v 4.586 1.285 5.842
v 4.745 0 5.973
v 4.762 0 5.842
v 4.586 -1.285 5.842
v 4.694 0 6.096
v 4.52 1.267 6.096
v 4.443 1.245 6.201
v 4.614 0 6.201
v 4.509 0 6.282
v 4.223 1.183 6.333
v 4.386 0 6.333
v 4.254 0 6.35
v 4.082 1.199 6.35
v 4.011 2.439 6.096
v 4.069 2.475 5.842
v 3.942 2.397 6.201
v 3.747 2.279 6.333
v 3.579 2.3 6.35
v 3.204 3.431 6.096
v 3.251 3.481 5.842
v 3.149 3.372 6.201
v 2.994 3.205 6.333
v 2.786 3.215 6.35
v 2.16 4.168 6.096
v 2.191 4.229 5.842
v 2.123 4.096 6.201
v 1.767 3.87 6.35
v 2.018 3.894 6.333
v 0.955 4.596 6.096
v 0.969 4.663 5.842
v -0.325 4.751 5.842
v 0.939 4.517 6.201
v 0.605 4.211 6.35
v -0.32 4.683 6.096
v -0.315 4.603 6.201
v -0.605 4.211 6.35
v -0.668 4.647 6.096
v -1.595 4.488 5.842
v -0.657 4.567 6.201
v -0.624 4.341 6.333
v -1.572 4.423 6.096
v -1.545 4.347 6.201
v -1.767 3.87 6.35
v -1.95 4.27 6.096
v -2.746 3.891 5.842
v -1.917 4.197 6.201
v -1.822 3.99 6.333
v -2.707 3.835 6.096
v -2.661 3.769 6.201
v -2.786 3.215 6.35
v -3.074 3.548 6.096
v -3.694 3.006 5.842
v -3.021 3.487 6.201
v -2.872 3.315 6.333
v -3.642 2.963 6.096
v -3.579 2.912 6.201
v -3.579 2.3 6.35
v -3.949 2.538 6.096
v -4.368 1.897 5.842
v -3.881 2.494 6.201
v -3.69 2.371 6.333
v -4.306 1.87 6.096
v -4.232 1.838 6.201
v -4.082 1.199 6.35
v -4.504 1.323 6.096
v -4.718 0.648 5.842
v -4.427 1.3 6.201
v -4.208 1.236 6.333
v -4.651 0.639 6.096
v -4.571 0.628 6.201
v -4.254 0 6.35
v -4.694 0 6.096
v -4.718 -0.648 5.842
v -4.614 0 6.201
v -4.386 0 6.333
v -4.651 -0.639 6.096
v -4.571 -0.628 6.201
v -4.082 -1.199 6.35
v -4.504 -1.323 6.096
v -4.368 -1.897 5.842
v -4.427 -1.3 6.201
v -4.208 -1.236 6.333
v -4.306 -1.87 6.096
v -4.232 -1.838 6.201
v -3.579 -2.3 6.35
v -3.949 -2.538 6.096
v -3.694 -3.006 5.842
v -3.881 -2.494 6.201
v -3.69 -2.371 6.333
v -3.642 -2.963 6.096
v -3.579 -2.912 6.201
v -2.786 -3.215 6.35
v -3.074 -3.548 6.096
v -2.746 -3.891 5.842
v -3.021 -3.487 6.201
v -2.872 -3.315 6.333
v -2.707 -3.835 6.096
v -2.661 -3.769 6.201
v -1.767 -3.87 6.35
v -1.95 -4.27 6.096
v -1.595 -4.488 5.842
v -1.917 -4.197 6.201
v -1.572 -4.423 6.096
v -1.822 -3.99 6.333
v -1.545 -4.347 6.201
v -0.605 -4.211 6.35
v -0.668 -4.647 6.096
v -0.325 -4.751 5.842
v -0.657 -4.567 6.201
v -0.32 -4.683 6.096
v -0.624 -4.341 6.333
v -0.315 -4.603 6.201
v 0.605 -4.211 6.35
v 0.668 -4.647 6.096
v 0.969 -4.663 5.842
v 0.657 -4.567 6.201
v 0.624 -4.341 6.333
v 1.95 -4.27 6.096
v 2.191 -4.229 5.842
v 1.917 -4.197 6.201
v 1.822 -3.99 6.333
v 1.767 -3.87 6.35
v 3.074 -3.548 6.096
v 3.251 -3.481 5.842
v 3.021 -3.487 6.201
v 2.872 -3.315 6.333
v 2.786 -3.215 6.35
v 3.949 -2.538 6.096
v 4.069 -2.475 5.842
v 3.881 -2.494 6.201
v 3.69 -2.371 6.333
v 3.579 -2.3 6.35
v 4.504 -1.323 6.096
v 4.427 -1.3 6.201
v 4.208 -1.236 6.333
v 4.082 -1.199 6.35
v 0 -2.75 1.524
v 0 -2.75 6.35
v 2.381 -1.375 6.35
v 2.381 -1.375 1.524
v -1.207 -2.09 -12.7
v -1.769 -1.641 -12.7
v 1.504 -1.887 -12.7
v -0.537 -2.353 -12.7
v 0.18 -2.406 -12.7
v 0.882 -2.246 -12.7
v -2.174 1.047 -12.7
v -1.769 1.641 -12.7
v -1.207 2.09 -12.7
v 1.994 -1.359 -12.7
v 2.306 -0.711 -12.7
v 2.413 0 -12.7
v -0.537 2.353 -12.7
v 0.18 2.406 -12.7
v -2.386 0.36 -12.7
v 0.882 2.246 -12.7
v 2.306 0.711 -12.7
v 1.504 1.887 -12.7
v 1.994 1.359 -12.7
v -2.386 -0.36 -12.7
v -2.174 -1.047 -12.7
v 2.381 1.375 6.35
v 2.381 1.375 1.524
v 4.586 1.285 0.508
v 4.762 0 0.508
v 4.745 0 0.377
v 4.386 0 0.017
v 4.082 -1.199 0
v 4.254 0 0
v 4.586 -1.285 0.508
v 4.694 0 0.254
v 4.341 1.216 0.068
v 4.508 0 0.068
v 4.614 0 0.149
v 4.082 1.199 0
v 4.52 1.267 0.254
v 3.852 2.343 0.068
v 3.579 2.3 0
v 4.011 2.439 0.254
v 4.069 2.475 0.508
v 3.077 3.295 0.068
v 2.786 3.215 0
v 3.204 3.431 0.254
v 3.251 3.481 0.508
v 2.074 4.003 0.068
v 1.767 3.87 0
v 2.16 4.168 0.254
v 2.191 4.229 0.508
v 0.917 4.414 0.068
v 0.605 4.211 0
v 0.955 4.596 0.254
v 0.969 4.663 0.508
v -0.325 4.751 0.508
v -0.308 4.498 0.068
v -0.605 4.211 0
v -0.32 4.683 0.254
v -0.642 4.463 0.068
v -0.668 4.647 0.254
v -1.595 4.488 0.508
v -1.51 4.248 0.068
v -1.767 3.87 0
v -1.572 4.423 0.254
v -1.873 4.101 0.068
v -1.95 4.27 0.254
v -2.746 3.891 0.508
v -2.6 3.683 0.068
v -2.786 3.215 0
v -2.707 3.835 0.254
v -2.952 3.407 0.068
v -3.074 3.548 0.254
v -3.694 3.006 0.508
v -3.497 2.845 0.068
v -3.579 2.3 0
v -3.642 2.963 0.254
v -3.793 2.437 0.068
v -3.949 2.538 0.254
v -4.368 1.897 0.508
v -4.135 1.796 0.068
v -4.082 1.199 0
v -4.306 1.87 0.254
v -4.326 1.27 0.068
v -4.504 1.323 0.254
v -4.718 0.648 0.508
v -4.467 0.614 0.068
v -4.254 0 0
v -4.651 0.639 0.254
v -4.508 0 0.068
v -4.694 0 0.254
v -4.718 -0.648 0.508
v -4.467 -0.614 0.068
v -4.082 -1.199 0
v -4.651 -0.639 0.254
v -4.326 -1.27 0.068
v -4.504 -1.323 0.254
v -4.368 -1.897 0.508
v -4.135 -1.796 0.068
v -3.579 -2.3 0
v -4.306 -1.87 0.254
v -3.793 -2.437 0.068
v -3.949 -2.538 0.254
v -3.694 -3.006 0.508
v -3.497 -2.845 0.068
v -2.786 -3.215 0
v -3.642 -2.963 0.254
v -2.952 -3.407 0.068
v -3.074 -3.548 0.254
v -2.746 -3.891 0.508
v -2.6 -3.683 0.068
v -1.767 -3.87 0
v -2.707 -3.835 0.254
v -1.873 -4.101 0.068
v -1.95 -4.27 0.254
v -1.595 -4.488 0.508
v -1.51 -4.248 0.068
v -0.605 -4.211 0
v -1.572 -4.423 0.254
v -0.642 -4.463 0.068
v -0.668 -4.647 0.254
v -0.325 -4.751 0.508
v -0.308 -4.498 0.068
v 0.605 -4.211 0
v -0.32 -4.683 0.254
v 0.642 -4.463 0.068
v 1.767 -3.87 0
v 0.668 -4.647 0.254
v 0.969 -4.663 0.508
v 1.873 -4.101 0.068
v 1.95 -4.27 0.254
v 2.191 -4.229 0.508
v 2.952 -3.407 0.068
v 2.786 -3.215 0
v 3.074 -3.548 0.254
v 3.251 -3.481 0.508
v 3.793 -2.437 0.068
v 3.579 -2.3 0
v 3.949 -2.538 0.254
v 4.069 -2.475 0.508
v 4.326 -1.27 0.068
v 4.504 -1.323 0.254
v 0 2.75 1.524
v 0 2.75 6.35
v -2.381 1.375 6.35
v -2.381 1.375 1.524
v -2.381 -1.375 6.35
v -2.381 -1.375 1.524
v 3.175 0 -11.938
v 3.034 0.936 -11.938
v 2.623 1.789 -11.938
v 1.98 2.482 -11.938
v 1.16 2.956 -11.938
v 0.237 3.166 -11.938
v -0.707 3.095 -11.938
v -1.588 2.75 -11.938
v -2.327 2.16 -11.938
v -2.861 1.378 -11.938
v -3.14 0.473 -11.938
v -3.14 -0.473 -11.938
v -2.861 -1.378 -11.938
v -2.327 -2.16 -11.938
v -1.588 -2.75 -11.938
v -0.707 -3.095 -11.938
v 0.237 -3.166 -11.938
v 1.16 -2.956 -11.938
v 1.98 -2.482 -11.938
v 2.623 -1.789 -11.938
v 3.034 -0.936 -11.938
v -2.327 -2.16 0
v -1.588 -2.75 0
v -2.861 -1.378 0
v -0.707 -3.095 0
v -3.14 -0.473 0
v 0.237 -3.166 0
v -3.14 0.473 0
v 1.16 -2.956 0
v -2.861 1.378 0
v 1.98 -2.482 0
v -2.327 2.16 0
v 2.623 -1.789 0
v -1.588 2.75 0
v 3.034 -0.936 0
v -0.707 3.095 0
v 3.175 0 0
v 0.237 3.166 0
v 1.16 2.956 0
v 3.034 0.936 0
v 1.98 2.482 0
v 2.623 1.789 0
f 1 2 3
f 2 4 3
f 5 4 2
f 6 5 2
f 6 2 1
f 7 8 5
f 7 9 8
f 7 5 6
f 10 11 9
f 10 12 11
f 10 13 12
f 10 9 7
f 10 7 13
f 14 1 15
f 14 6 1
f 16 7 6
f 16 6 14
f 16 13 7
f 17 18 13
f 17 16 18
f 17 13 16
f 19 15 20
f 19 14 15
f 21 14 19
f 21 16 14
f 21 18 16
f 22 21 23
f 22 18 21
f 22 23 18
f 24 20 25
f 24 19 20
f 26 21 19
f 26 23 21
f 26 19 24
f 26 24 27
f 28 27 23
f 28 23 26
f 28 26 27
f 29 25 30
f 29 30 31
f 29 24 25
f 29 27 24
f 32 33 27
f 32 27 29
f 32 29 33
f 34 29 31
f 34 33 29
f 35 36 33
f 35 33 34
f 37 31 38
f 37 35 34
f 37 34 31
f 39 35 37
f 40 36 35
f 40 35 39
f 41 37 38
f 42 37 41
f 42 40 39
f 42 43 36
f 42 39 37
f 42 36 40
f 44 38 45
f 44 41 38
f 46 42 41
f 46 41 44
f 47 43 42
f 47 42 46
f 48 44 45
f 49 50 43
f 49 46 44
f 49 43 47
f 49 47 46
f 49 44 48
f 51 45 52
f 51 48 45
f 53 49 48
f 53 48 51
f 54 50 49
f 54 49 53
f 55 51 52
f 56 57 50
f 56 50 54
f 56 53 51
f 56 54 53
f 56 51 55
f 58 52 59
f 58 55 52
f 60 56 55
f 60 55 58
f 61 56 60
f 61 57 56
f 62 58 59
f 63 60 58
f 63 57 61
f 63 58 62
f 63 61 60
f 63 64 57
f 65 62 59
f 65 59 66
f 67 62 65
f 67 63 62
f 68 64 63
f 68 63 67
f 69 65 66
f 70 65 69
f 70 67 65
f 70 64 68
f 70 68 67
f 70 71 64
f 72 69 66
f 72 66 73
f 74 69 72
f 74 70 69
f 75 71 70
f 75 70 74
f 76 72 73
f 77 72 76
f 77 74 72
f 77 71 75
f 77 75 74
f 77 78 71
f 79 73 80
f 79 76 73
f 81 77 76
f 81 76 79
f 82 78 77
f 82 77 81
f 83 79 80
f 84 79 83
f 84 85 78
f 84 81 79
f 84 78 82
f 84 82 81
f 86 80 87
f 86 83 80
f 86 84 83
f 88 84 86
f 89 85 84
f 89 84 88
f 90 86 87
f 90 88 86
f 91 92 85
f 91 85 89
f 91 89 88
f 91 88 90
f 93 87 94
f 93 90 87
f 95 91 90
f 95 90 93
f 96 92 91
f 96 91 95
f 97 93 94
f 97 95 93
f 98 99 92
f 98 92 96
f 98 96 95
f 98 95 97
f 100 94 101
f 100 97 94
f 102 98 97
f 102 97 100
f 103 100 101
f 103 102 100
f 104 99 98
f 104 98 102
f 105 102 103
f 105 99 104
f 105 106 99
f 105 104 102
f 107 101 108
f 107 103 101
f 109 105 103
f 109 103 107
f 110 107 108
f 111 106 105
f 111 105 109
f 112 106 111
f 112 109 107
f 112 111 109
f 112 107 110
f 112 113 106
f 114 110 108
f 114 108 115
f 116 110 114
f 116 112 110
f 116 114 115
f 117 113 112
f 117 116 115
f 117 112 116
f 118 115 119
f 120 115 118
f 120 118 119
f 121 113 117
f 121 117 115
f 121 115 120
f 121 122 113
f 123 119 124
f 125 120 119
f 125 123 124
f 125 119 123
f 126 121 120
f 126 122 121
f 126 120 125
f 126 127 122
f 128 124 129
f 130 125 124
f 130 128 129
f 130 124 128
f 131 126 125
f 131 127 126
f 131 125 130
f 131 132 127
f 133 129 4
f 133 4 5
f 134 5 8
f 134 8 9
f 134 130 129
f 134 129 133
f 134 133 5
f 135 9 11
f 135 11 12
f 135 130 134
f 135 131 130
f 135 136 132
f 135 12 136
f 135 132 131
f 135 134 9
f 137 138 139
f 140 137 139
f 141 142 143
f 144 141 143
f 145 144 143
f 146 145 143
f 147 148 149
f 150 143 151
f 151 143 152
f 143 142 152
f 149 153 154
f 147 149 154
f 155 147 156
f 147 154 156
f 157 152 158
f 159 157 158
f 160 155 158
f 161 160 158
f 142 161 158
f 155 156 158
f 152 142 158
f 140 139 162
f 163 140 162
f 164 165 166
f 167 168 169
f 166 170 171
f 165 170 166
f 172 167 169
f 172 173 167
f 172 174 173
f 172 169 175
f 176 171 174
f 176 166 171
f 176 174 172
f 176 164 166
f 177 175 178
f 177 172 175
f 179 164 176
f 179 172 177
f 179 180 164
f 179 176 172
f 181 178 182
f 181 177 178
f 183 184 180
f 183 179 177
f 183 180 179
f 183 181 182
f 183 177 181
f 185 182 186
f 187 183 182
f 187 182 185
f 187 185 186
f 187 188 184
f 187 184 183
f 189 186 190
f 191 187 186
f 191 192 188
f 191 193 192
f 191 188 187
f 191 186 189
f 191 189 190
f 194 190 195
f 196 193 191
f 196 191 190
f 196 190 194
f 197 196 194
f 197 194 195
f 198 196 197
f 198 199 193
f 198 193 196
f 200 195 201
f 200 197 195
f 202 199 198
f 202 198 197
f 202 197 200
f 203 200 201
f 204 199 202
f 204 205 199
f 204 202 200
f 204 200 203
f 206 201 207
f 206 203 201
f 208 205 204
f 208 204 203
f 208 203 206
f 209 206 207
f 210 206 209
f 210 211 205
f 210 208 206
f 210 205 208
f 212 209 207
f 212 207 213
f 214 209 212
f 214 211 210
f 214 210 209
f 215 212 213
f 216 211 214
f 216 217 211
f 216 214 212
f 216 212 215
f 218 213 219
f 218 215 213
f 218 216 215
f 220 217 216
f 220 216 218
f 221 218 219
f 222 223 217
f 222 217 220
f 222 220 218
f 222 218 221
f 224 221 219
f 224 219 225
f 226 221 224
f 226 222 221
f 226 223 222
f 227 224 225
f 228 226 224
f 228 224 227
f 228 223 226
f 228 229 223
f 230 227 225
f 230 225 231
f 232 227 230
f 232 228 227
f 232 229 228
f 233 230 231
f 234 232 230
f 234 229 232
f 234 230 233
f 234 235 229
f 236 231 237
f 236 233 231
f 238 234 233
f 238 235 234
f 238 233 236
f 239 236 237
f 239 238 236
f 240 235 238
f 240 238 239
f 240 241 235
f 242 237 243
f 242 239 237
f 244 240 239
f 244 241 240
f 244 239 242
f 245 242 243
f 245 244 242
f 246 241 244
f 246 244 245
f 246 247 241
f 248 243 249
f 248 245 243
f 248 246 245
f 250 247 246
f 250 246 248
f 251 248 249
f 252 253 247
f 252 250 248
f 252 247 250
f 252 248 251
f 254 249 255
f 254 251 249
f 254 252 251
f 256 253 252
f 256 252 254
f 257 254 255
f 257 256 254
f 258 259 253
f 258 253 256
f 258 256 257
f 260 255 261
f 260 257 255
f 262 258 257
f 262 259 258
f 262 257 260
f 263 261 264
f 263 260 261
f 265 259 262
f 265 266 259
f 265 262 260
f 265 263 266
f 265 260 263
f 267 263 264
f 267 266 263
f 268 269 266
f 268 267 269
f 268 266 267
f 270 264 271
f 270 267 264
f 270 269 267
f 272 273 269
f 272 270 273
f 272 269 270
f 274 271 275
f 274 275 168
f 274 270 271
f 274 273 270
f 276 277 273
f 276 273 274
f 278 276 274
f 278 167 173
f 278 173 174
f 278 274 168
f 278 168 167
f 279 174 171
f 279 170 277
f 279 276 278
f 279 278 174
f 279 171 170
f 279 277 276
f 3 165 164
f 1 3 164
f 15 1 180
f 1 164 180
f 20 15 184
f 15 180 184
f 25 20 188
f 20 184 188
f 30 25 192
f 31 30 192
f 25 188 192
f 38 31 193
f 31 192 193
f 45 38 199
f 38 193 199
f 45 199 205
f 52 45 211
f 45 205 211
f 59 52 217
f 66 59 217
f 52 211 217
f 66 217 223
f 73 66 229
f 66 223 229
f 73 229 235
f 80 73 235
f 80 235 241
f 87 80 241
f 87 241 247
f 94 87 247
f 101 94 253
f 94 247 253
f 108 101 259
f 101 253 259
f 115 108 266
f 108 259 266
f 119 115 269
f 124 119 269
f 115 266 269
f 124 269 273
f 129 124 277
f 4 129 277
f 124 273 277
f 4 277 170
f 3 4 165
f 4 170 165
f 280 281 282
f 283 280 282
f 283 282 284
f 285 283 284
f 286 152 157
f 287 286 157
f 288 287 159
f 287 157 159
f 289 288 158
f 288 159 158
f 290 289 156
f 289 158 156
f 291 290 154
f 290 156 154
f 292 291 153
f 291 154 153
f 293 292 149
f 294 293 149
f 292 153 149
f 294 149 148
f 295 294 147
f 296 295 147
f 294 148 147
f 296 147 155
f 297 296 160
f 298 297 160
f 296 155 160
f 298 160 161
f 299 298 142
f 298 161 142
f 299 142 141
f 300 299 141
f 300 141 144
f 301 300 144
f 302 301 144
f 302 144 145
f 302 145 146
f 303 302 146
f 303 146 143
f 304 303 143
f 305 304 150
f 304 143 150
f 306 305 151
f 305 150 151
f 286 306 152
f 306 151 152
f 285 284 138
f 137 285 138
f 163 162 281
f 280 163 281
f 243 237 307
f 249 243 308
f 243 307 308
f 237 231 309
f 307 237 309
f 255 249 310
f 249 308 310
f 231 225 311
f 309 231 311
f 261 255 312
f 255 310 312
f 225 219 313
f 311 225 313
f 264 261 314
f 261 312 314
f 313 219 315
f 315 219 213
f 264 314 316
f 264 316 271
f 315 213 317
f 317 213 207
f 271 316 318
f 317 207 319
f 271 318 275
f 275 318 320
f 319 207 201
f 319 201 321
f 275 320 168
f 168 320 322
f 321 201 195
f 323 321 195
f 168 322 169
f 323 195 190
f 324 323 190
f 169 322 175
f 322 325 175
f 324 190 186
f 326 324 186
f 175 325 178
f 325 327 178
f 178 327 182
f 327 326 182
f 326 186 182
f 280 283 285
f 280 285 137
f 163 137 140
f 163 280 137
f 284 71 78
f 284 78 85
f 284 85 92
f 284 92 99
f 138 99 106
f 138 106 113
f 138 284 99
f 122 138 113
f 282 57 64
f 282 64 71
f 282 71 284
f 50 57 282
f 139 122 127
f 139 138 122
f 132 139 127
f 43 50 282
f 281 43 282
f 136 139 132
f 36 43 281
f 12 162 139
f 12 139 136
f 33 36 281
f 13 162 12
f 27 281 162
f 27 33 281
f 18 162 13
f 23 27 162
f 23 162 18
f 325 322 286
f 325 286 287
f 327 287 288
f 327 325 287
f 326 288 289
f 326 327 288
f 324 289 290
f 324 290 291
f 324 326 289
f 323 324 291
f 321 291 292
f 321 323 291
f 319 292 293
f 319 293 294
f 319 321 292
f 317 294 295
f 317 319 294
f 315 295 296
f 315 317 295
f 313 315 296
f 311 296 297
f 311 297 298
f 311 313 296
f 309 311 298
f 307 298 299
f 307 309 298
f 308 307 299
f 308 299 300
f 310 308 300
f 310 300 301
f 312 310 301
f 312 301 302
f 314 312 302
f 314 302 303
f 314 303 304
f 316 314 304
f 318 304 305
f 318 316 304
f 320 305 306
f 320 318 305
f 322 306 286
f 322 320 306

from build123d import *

# Parameters (mm, degrees)
F1_R     = 4.7625
F4_DEPTH = 6.35
F6_DEPTH = 4.826
F2_R     = 3.175
F7_DEPTH = 12.7
F9_SIZE2 = 0.762
F9_SIZE  = 0.762
F10_R    = 0.508


# Not quite as in the source:
# - the program builds the solid bodies; features that only make, move or delete a surface that nothing else refers to are left out


with BuildPart() as f4:
    # F1 (on Top) → F4 (new body)
    with BuildSketch(Plane.XY):
        Circle(F1_R)
    extrude(amount=F4_DEPTH)

    # F5 (on face) → F6 (cut)
    with BuildSketch(Plane.XY.offset(6.35)):
        Polygon((2.38125, -1.3748153285), (2.38125, 1.3748153285), (0, 2.749630657), (-2.38125, 1.3748153285), (-2.38125, -1.3748153285), (0, -2.749630657), align=None)
    extrude(amount=-F6_DEPTH, mode=Mode.SUBTRACT)

    # F2 (on Top) → F7 (join)
    with BuildSketch(Plane.XY):
        Circle(F2_R)
    extrude(amount=-F7_DEPTH)

    # F9
    f9_edges = [f4.edges().sort_by_distance(p)[0] for p in [
        (-3.175, 0, -12.7),
    ]]
    chamfer(f9_edges, length=F9_SIZE, length2=F9_SIZE2)

    # F10
    f10_edges = [f4.edges().sort_by_distance(p)[0] for p in [
        (-4.7625, 0, 6.35),
        (-4.7625, 0, 0),
    ]]
    fillet(f10_edges, radius=F10_R)


solid = f4.part
